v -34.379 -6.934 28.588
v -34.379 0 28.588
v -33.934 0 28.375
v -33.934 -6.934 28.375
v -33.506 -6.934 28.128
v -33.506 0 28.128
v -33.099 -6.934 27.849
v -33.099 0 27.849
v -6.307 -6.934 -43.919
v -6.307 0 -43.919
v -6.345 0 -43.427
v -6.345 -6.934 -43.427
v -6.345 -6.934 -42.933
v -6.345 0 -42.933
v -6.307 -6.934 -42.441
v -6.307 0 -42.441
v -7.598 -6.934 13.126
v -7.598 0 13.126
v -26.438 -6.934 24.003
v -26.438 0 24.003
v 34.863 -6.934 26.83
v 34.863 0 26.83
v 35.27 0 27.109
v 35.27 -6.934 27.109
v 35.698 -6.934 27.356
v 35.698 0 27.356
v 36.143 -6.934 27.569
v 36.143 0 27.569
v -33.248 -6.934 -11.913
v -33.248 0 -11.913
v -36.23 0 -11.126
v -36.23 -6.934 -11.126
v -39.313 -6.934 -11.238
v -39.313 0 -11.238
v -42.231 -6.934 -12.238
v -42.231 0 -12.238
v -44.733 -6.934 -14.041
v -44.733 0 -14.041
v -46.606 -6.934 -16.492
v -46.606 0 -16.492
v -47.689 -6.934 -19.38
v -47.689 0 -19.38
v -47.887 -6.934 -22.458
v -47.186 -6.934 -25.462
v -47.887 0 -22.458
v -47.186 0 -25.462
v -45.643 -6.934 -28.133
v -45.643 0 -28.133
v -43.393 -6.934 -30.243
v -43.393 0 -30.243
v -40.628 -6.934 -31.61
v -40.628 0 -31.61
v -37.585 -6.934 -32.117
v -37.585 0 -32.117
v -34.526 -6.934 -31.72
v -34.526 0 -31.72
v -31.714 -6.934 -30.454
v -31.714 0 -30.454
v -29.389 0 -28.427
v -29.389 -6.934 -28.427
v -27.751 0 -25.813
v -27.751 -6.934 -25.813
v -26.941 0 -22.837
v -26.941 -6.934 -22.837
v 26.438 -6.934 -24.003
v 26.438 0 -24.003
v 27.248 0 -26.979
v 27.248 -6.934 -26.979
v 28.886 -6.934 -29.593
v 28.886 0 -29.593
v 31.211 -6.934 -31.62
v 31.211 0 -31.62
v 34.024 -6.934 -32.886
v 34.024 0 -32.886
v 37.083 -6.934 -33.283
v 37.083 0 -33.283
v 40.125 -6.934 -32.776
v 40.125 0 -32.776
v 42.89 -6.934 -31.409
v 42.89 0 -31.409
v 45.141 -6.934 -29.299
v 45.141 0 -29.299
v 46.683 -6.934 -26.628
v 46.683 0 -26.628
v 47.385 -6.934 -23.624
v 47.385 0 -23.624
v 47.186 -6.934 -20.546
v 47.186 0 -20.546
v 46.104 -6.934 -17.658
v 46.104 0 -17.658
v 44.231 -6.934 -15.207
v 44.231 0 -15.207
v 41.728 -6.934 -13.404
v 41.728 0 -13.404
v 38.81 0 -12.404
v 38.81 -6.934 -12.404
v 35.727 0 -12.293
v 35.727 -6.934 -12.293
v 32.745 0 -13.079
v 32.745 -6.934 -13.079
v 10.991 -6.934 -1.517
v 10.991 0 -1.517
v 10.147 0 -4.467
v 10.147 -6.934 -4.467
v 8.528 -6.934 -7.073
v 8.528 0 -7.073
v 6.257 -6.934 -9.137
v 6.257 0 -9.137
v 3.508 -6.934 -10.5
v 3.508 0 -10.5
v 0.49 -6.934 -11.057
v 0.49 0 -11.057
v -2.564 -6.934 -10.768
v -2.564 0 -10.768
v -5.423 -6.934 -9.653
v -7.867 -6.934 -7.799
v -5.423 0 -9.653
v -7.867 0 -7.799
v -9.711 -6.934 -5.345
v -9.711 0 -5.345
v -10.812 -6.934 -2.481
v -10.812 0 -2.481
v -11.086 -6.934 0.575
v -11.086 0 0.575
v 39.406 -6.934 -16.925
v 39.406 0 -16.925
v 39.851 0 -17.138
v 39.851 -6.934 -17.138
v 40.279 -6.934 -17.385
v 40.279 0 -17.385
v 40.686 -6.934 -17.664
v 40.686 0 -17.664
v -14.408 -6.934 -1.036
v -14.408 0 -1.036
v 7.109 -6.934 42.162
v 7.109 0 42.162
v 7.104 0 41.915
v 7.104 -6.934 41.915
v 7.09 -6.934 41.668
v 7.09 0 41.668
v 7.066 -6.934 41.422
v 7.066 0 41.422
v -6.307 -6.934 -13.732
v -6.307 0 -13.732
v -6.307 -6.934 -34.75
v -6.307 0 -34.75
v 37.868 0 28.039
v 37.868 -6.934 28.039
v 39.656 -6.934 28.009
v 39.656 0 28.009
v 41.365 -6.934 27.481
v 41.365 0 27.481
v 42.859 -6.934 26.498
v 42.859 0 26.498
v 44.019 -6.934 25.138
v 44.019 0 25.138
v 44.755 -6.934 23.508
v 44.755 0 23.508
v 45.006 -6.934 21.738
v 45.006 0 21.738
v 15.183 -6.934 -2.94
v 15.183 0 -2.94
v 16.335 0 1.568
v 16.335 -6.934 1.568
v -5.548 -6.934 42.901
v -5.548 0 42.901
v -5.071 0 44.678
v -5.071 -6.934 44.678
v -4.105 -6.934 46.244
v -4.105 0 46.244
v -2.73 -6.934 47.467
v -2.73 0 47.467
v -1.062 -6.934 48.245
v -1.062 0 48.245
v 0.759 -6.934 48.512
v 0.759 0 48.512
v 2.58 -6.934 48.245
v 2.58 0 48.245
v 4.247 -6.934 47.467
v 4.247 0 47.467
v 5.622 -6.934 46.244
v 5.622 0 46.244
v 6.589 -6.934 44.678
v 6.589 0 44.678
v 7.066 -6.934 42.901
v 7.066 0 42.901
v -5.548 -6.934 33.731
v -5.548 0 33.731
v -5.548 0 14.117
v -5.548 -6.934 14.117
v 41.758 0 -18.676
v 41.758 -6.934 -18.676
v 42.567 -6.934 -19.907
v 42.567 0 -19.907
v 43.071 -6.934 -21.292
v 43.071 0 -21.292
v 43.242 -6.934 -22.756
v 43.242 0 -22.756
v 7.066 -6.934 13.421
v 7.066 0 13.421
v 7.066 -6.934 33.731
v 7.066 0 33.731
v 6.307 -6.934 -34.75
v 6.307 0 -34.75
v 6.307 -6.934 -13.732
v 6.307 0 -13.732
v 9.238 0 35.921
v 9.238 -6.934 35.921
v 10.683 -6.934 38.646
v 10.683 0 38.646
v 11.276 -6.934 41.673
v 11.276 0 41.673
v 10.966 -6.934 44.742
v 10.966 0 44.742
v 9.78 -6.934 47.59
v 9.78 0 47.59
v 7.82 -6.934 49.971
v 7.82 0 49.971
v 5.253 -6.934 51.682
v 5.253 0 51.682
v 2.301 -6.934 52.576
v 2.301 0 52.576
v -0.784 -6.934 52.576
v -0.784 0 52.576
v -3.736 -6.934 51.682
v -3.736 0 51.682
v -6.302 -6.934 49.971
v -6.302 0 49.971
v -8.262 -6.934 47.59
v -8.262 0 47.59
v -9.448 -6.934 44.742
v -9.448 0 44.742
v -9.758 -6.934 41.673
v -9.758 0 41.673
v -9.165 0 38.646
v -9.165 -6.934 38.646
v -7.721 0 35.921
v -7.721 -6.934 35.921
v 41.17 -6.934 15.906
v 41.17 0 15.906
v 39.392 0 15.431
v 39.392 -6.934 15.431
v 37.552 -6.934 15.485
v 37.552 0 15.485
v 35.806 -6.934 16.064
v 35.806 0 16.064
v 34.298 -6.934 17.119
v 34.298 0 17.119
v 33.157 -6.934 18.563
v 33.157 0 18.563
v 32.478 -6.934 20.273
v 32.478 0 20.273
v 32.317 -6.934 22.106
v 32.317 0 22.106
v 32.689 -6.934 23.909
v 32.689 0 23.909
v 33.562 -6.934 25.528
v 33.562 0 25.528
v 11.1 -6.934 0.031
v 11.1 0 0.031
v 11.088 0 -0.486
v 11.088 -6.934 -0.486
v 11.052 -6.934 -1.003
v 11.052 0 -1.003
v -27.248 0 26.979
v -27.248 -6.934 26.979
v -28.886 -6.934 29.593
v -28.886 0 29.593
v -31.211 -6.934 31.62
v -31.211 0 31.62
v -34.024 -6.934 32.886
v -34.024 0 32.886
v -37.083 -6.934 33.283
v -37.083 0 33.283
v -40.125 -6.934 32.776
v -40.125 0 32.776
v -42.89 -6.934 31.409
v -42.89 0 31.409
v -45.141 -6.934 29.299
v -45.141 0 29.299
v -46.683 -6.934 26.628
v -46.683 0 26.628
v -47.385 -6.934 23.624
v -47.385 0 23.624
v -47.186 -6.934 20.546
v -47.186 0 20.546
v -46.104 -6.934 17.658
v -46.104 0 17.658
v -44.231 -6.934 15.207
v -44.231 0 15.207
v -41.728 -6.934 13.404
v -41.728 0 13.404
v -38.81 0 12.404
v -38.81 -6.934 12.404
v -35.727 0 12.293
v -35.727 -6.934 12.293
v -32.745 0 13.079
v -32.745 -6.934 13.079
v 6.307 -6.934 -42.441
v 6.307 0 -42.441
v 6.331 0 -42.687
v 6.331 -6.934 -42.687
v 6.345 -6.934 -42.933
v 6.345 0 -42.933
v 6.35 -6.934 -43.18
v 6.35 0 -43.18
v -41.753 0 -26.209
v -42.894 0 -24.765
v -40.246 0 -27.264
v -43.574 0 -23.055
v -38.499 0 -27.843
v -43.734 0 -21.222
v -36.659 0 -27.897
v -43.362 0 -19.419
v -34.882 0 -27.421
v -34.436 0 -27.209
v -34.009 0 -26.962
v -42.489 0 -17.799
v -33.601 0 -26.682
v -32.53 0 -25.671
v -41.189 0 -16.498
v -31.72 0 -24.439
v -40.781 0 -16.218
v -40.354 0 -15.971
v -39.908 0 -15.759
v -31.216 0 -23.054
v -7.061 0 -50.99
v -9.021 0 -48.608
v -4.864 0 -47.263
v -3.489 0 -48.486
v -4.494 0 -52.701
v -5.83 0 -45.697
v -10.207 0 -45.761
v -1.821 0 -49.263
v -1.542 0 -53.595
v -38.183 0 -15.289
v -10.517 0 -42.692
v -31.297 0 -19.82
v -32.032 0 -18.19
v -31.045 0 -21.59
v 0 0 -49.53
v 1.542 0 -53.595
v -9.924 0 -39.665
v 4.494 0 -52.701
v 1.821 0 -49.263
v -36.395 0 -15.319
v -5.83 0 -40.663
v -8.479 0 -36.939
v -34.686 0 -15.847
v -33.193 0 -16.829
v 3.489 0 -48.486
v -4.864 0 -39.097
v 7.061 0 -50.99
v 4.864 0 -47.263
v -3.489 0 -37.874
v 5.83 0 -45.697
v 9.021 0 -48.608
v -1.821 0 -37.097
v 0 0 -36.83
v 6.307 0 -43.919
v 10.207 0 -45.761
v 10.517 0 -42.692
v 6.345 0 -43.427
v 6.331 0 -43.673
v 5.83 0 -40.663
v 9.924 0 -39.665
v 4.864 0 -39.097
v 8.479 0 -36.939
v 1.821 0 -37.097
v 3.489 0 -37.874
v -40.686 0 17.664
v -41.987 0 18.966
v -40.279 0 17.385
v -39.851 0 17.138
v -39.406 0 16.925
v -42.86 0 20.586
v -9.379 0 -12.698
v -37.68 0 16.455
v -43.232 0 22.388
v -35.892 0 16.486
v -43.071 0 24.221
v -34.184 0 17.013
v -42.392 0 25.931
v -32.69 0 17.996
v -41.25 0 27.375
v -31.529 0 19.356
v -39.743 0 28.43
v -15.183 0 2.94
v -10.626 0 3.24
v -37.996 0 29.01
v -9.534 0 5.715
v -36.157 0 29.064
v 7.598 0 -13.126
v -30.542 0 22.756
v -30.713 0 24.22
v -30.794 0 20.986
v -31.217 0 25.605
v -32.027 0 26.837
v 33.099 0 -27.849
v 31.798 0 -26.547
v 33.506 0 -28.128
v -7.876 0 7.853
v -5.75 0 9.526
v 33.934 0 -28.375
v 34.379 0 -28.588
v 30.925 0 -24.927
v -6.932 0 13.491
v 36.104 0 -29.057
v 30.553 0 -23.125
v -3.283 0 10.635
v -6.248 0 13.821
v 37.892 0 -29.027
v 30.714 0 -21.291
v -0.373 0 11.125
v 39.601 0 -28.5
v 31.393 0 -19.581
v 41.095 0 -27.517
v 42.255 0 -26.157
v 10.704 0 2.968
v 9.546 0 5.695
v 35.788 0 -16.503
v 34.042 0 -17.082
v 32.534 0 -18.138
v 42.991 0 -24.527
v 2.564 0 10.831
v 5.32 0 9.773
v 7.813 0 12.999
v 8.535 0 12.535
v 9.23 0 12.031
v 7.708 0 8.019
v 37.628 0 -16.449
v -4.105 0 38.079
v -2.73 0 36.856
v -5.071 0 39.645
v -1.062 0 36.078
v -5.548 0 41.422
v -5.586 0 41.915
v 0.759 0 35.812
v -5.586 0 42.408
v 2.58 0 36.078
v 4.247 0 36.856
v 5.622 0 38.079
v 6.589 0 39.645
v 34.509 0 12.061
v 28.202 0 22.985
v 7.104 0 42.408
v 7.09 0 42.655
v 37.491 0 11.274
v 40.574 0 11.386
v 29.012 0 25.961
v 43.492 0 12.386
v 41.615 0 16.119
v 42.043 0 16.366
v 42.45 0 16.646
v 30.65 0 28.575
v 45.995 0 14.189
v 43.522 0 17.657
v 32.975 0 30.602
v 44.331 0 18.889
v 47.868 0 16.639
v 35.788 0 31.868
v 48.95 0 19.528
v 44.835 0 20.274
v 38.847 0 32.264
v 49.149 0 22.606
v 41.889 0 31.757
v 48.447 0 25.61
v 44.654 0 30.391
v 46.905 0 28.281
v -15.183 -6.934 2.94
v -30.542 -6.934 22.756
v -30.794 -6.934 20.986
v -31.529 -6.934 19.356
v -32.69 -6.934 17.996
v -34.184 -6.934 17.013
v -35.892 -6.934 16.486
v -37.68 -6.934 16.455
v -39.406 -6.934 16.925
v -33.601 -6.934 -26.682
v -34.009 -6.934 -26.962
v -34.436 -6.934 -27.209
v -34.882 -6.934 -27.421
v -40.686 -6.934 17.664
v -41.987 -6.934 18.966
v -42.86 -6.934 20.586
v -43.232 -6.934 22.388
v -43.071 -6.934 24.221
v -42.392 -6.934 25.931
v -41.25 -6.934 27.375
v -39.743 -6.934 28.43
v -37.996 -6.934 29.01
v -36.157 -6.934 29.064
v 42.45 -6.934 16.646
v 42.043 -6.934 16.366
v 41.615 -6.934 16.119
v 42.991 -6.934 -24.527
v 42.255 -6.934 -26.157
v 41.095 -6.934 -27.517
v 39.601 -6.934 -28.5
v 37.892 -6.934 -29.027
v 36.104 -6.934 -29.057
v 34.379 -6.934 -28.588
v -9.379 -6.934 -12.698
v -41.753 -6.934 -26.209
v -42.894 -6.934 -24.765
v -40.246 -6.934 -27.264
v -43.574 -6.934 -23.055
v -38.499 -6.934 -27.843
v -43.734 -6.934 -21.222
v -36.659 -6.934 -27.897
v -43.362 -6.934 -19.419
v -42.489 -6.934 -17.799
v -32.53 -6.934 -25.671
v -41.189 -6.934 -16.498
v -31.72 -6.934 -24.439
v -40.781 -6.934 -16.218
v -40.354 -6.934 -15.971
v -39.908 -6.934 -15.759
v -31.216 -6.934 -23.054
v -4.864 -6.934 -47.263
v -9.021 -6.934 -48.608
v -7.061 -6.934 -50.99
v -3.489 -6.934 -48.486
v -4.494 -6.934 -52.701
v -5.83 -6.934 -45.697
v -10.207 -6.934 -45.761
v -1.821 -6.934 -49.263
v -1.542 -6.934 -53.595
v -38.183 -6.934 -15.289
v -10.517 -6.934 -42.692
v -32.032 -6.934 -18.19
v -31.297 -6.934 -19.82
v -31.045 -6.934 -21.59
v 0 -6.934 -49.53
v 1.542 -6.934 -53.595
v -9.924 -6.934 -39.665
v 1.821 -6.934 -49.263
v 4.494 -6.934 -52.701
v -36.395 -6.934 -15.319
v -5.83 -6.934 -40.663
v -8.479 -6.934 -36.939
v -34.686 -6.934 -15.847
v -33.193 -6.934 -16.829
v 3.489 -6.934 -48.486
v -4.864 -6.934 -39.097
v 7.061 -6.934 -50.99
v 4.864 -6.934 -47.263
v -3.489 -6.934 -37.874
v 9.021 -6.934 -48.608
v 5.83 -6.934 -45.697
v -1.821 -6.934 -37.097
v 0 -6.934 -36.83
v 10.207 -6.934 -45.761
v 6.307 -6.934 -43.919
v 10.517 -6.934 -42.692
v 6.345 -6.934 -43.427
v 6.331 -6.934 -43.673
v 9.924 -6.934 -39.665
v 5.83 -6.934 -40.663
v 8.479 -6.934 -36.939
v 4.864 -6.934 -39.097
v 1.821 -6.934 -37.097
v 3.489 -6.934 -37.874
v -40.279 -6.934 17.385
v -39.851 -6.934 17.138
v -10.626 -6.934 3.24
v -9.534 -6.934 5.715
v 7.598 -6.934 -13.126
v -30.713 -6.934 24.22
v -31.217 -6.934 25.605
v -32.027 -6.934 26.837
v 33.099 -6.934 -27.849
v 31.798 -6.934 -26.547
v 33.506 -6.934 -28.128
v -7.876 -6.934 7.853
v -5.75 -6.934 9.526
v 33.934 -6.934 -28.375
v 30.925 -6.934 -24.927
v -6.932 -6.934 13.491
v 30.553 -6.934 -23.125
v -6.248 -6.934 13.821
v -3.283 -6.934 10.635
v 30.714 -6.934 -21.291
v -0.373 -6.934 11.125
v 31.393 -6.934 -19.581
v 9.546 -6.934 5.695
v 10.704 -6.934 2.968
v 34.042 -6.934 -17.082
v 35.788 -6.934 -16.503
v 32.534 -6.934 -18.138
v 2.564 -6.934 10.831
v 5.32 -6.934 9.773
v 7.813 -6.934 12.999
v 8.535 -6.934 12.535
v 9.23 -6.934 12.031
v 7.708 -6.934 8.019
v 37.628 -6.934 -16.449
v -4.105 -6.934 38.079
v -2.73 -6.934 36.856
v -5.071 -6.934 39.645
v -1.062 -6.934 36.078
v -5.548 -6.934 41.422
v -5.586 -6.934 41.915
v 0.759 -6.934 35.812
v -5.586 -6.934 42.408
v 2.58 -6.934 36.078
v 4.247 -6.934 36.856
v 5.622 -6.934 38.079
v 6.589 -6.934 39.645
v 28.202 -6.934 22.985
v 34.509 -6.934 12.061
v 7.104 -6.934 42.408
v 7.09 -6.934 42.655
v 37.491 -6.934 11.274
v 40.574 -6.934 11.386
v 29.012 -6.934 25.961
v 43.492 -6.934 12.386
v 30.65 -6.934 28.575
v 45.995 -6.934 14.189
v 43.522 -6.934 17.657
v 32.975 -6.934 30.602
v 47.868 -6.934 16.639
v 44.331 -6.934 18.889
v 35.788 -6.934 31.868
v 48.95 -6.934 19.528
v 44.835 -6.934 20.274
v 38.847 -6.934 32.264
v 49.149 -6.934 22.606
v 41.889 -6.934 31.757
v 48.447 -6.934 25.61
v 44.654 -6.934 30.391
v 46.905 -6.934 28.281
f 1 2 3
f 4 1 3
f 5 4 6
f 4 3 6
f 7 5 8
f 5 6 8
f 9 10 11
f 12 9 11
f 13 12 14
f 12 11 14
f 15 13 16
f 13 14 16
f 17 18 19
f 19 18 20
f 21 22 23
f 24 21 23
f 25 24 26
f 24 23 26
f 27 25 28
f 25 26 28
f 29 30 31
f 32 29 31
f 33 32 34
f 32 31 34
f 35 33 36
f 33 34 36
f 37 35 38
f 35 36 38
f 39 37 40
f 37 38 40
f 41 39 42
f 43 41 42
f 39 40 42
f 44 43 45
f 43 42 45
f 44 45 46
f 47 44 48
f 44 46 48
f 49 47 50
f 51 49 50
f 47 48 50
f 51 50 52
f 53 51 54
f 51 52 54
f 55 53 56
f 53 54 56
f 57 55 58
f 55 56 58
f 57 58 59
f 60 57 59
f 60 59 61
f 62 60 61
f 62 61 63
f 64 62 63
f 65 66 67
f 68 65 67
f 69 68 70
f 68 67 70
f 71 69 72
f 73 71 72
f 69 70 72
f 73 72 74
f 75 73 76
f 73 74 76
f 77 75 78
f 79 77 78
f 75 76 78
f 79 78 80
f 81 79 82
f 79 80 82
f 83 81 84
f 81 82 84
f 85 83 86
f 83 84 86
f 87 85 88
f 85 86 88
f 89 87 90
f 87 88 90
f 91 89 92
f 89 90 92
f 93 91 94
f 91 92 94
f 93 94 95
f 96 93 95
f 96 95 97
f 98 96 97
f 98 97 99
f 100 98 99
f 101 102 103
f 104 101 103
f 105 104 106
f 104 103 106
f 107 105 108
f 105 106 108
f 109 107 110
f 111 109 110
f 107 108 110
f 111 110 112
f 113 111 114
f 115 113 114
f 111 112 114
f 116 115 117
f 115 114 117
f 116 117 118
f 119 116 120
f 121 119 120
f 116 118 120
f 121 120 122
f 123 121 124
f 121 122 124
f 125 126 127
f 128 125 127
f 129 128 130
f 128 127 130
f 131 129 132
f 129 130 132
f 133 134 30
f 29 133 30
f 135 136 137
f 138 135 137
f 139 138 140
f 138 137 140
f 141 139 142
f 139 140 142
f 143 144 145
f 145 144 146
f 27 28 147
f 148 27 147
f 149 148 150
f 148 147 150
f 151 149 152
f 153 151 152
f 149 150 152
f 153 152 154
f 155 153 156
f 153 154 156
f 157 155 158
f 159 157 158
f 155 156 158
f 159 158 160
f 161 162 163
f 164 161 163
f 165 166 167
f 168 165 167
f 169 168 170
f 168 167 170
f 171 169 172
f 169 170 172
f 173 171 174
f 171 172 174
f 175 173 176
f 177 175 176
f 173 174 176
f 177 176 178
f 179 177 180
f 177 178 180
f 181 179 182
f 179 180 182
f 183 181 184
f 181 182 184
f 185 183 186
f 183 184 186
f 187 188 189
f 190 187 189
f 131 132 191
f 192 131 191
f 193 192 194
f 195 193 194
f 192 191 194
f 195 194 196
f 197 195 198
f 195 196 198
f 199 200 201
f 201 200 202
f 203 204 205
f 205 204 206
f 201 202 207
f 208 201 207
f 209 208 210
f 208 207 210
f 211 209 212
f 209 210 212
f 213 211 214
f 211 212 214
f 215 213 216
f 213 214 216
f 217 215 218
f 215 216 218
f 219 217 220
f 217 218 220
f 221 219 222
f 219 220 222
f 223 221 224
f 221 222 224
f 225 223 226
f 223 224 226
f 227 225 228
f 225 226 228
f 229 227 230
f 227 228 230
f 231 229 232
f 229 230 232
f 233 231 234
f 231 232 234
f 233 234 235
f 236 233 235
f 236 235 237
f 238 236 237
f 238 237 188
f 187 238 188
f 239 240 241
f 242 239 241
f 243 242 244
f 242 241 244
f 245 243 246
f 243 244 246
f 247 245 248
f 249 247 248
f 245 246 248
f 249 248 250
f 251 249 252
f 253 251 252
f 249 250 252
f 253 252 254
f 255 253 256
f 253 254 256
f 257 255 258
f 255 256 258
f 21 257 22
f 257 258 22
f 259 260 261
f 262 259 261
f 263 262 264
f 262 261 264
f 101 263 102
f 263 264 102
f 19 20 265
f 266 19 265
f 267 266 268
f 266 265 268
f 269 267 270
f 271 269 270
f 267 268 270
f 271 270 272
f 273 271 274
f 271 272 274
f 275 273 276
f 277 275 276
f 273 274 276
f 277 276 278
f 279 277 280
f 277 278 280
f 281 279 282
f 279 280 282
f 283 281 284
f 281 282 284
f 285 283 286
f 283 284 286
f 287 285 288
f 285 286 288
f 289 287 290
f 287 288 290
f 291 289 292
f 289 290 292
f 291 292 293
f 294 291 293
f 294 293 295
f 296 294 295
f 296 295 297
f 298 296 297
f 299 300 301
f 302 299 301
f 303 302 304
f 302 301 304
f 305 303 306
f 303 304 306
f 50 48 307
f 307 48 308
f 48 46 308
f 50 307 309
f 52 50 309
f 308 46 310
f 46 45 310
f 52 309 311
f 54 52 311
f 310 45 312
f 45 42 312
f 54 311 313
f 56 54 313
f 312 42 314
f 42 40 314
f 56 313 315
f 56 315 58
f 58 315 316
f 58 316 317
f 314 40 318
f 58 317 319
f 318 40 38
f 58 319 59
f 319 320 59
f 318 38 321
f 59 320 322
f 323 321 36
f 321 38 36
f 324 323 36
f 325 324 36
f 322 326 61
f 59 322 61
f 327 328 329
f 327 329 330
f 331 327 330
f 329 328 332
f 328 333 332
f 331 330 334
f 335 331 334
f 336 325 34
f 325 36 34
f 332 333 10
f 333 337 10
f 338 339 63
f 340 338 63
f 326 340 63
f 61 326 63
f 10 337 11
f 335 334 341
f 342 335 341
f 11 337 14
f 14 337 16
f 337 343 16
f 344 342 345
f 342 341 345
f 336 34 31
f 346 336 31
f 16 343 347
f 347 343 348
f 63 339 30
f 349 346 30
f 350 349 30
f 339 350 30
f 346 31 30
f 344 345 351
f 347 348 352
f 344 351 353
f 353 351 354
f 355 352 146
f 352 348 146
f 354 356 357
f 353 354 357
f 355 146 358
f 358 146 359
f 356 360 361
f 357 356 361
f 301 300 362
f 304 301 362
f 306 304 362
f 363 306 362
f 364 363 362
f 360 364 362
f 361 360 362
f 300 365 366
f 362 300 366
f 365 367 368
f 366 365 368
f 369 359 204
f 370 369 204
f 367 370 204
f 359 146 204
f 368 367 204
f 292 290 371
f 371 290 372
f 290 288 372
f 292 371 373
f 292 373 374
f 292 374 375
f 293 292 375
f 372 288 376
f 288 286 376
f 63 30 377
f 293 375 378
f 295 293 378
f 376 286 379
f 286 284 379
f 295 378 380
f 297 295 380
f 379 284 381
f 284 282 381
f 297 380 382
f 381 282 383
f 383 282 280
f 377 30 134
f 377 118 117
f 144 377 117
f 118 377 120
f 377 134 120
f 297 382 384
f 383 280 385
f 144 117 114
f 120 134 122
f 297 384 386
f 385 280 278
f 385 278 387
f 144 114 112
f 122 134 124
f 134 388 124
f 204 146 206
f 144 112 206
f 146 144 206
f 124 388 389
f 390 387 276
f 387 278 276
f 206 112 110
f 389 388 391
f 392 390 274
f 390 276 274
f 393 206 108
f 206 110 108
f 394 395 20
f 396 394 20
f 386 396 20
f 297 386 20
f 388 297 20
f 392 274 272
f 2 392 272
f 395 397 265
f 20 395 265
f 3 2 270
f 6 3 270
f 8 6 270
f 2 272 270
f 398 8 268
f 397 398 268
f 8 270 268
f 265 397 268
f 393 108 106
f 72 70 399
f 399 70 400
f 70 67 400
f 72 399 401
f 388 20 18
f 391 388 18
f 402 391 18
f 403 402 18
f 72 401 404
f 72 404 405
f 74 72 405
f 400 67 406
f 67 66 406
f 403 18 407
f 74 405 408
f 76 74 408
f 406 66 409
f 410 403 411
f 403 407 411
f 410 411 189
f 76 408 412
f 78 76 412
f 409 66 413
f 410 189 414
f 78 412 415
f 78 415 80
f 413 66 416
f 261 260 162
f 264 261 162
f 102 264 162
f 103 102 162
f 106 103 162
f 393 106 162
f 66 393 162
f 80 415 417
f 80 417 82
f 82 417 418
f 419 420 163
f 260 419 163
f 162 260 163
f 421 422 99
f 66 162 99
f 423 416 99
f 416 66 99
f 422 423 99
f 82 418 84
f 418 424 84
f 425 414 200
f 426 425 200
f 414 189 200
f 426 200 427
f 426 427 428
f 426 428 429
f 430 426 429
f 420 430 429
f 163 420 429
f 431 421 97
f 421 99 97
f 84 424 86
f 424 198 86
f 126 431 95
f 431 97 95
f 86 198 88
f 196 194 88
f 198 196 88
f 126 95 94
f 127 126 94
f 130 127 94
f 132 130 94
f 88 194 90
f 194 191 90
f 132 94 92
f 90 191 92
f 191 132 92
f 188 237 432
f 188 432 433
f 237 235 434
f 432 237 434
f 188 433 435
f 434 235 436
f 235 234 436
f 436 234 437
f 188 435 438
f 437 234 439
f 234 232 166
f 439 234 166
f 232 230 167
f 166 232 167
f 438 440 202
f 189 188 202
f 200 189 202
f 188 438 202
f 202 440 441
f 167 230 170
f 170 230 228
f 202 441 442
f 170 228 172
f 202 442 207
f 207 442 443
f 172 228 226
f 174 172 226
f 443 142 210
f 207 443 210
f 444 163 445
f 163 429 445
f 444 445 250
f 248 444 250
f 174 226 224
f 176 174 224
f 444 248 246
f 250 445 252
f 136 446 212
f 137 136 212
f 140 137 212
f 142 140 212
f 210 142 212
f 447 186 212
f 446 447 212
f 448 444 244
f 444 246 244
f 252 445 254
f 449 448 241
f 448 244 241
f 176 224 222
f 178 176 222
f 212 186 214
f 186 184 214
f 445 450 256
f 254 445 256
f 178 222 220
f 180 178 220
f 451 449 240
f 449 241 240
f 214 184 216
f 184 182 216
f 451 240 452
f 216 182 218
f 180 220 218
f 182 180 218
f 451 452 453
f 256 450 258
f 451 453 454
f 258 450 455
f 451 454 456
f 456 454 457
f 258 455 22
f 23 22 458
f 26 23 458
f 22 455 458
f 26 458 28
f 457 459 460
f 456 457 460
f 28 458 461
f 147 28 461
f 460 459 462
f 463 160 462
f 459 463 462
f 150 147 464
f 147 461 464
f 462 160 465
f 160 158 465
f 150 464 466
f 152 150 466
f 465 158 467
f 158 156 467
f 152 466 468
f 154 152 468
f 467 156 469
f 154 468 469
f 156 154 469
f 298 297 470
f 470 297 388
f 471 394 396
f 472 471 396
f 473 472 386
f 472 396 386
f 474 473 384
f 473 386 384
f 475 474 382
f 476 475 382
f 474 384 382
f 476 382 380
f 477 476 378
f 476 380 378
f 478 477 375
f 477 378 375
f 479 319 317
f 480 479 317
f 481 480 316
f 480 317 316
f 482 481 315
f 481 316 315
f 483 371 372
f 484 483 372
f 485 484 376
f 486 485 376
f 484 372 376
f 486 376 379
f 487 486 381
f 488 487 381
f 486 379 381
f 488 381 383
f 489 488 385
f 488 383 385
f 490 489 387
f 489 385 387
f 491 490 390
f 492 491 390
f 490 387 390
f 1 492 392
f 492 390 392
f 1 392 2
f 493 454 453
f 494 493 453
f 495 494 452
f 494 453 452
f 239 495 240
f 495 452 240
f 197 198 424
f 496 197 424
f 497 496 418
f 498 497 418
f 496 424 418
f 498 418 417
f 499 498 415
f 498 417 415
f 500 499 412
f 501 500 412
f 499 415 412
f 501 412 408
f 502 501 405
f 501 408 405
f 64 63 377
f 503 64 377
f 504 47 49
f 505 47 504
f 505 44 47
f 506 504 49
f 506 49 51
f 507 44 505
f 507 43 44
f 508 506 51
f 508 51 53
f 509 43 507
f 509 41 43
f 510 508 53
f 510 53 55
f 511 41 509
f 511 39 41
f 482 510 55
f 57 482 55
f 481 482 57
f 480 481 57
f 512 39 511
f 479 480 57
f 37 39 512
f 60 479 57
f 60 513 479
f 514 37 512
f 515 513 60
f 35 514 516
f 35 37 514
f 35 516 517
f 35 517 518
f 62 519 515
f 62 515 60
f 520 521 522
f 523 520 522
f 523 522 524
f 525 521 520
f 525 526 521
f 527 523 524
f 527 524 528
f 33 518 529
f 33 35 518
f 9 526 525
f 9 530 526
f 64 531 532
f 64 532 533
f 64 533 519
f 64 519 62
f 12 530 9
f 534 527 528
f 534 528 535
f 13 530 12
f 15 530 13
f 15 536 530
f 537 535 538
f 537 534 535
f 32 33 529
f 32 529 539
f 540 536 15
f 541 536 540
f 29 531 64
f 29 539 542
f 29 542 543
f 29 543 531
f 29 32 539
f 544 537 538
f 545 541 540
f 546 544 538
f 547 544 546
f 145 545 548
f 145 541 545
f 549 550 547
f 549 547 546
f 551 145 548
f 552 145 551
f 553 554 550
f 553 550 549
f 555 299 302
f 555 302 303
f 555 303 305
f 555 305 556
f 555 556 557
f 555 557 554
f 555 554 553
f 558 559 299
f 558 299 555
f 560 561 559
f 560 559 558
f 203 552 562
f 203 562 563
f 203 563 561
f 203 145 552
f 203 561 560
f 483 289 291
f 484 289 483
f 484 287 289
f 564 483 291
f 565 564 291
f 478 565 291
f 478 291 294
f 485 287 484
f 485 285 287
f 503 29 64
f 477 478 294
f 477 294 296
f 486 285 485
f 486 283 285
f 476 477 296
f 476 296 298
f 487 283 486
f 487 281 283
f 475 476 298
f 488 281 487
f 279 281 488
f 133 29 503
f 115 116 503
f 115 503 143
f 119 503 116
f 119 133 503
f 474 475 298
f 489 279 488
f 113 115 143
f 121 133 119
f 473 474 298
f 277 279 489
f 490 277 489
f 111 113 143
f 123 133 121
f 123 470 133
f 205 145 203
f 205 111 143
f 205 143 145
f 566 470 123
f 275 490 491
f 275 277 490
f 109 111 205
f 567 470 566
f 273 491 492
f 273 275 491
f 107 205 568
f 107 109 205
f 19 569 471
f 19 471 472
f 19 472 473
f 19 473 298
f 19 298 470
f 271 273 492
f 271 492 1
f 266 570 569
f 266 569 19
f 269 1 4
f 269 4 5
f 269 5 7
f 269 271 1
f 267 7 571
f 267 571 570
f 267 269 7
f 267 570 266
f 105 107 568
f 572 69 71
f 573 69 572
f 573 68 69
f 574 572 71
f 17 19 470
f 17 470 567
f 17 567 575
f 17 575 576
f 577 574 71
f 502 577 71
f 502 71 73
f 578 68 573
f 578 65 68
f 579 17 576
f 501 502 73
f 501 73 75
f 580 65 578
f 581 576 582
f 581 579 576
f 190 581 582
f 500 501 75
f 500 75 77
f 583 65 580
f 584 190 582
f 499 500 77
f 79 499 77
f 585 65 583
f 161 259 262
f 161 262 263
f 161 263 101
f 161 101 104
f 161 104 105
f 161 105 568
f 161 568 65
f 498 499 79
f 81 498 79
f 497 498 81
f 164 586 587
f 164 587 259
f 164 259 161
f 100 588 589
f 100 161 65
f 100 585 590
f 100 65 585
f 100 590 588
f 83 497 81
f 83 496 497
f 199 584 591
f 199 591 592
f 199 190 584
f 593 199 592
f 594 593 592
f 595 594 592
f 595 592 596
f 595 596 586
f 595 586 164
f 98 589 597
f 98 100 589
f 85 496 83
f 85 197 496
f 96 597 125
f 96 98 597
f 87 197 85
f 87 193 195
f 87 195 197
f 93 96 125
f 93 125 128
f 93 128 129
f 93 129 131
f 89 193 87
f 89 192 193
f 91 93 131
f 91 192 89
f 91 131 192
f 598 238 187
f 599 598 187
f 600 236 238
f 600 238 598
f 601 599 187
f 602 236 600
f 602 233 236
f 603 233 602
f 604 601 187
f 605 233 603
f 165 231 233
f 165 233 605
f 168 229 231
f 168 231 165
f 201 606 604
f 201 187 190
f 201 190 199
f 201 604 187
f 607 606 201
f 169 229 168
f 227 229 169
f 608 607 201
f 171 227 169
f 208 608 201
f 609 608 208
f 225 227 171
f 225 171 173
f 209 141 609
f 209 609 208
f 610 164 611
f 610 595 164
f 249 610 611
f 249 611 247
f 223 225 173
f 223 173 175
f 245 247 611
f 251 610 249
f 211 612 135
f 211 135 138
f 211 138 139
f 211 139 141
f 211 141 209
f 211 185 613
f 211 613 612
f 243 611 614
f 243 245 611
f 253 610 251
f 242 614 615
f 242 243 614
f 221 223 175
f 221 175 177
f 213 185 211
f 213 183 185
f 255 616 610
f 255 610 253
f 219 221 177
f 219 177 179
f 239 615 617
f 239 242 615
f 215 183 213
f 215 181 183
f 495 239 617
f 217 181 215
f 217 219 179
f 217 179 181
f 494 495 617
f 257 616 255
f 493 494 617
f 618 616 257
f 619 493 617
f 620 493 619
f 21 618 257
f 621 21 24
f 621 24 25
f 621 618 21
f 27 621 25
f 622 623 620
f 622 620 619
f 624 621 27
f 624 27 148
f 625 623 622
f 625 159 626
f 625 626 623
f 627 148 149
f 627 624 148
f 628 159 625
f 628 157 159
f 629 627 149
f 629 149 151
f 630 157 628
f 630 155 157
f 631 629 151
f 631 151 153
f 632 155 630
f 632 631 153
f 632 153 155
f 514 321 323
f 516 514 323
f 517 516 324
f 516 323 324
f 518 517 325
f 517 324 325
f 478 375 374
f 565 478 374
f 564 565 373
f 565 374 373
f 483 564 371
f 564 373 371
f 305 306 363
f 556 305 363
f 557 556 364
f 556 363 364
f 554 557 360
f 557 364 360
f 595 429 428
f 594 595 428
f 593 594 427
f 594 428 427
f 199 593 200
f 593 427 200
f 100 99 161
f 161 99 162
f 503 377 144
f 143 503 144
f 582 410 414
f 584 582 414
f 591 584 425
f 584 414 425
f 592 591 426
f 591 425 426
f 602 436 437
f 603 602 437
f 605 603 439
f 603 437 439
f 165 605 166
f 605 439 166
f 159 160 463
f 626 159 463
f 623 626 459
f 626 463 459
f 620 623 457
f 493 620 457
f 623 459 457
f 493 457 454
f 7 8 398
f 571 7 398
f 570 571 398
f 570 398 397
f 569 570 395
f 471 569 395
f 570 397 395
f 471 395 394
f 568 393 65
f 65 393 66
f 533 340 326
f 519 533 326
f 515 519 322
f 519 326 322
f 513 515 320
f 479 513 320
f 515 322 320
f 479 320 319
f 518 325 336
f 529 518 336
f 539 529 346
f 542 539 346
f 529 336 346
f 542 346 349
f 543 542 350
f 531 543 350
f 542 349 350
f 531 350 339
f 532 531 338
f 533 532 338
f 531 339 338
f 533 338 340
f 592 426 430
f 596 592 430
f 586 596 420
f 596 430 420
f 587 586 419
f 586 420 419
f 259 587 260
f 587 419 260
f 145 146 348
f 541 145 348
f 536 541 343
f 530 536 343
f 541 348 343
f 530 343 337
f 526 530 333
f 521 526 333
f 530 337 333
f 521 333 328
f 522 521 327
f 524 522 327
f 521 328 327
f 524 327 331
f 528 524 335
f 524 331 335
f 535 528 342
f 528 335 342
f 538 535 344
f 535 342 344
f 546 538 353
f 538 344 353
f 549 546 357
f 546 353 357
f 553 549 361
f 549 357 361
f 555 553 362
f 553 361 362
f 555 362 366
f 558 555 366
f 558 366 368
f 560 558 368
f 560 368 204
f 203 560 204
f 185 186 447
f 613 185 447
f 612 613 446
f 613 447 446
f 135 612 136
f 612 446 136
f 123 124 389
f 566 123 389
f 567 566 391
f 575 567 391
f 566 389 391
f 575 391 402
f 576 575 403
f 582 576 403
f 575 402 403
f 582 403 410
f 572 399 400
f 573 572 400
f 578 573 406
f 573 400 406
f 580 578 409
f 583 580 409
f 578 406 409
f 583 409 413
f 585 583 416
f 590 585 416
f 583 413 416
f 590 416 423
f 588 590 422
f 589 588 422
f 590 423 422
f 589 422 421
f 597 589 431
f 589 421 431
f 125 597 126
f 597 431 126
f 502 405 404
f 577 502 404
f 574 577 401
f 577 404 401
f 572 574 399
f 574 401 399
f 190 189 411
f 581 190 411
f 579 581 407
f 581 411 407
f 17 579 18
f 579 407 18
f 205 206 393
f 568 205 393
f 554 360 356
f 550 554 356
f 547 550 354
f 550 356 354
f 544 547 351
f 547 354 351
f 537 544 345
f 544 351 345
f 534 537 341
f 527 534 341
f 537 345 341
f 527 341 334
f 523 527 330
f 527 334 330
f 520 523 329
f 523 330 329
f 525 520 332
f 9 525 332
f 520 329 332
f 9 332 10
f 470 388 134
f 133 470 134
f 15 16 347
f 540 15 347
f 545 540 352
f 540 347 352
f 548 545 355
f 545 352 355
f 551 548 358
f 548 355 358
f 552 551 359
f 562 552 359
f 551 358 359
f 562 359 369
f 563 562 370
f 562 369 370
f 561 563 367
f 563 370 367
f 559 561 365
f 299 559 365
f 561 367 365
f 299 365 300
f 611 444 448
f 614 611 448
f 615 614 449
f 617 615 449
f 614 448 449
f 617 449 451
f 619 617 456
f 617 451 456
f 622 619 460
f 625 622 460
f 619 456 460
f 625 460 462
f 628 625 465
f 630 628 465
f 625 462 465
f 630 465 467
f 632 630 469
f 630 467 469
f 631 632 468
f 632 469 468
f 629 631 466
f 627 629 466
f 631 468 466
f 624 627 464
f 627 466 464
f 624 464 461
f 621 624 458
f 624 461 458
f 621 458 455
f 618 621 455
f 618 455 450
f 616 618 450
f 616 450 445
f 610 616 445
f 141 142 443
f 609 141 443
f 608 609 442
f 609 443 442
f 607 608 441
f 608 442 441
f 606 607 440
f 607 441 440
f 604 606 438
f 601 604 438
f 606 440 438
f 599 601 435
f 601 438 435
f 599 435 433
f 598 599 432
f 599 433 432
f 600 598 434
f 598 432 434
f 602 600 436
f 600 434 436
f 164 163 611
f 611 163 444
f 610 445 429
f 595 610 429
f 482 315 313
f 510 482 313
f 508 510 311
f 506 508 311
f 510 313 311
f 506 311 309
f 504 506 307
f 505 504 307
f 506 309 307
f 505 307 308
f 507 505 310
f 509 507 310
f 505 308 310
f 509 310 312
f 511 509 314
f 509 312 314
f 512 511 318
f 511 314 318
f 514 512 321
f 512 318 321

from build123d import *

# Parameters (mm, degrees)
F1_DEPTH = 6.9342


with BuildPart() as f1:
    # F0 (on Front) → F1 (new body)
    with BuildSketch(Plane.XZ):
        with BuildLine():
            Line((28.202122, 22.984592), (9.230435, 12.031283))
            ThreePointArc((9.230435, 12.031283), (8.177557, 12.772114), (7.065545, 13.420814))
            Line((7.065545, 13.420814), (7.065545, 33.731301))
            ThreePointArc((7.065545, 33.731301), (0.758717, 52.689846), (-5.54811, 33.731301))
            Line((-5.54811, 33.731301), (-5.54811, 14.117454))
            ThreePointArc((-5.54811, 14.117454), (-6.591857, 13.660258), (-7.59826, 13.125854))
            Line((-7.59826, 13.125854), (-26.438109, 24.003046))
            ThreePointArc((-26.438109, 24.003046), (-46.010104, 28.020445), (-32.744936, 13.0793))
            Line((-32.744936, 13.0793), (-15.183252, 2.940057))
            Line((-15.183252, 2.940057), (-14.407735, -1.035813))
            Line((-14.407735, -1.035813), (-33.247584, -11.913005))
            ThreePointArc((-33.247584, -11.913005), (-46.512752, -26.85415), (-26.940757, -22.83675))
            Line((-26.940757, -22.83675), (-9.379072, -12.697507))
            Line((-9.379072, -12.697507), (-6.306827, -13.731525))
            Line((-6.306827, -13.731525), (-6.306827, -34.749755))
            ThreePointArc((-6.306827, -34.749755), (0, -53.7083), (6.306827, -34.749755))
            Line((6.306827, -34.749755), (6.306827, -13.731525))
            Line((6.306827, -13.731525), (7.59826, -13.125854))
            Line((7.59826, -13.125854), (26.438109, -24.003046))
            ThreePointArc((26.438109, -24.003046), (46.010104, -28.020445), (32.744936, -13.0793))
            Line((32.744936, -13.0793), (15.183252, -2.940057))
            Line((15.183252, -2.940057), (16.33474, 1.567961))
            Line((16.33474, 1.567961), (34.50895, 12.060847))
            ThreePointArc((34.50895, 12.060847), (47.774118, 27.001992), (28.202122, 22.984592))
        make_face()
        with BuildLine():
            ThreePointArc((6.306827, -42.440791), (6.339198, -42.809766), (6.35, -43.18))
            ThreePointArc((6.35, -43.18), (6.339198, -43.550234), (6.306827, -43.919209))
            ThreePointArc((6.306827, -43.919209), (0, -49.53), (-6.306827, -43.919209))
            ThreePointArc((-6.306827, -43.919209), (-6.35, -43.18), (-6.306827, -42.440791))
            ThreePointArc((-6.306827, -42.440791), (0, -36.83), (6.306827, -42.440791))
        make_face(mode=Mode.SUBTRACT)
        with BuildLine():
            ThreePointArc((-34.881737, -27.421477), (-42.894238, -24.765), (-41.188564, -16.497732))
            ThreePointArc((-41.188564, -16.497732), (-40.569977, -16.090739), (-39.908217, -15.758523))
            ThreePointArc((-39.908217, -15.758523), (-33.904746, -16.285211), (-31.044977, -21.59))
            ThreePointArc((-31.044977, -21.59), (-31.719954, -24.438967), (-33.60139, -26.682268))
            ThreePointArc((-33.60139, -26.682268), (-34.219977, -27.089261), (-34.881737, -27.421477))
        make_face(mode=Mode.SUBTRACT)
        with BuildLine():
            ThreePointArc((43.242329, -22.756295), (40.38256, -28.061085), (34.379089, -28.587772))
            ThreePointArc((34.379089, -28.587772), (33.717329, -28.255557), (33.098742, -27.848564))
            ThreePointArc((33.098742, -27.848564), (31.393068, -19.581295), (39.405569, -16.924818))
            ThreePointArc((39.405569, -16.924818), (40.067329, -17.257034), (40.685916, -17.664027))
            ThreePointArc((40.685916, -17.664027), (42.567352, -19.907329), (43.242329, -22.756295))
        make_face(mode=Mode.SUBTRACT)
        with BuildLine():
            ThreePointArc((-33.098742, 27.848564), (-31.217306, 25.605262), (-30.542329, 22.756295))
            ThreePointArc((-30.542329, 22.756295), (-33.402098, 17.451506), (-39.405569, 16.924818))
            ThreePointArc((-39.405569, 16.924818), (-40.067329, 17.257034), (-40.685916, 17.664027))
            ThreePointArc((-40.685916, 17.664027), (-42.39159, 25.931295), (-34.379089, 28.587772))
            ThreePointArc((-34.379089, 28.587772), (-33.717329, 28.255557), (-33.098742, 27.848564))
        make_face(mode=Mode.SUBTRACT)
        with BuildLine():
            ThreePointArc((5.319741, 9.773443), (9.546036, 5.695287), (11.0998, 0.031477))
            ThreePointArc((11.0998, 0.031477), (11.072628, -0.744715), (10.991244, -1.517107))
            ThreePointArc((10.991244, -1.517107), (-1.047034, -11.01883), (-11.086495, 0.574793))
            ThreePointArc((-11.086495, 0.574793), (-8.770532, 6.834662), (-3.28325, 10.634581))
            ThreePointArc((-3.28325, 10.634581), (1.105538, 11.076084), (5.319741, 9.773443))
        make_face(mode=Mode.SUBTRACT)
        with BuildLine():
            ThreePointArc((36.143102, 27.569319), (42.146573, 27.042631), (45.006342, 21.737842))
            ThreePointArc((45.006342, 21.737842), (44.331366, 18.888875), (42.449929, 16.645573))
            ThreePointArc((42.449929, 16.645573), (41.831342, 16.23858), (41.169583, 15.906365))
            ThreePointArc((41.169583, 15.906365), (33.157081, 18.562842), (34.862755, 26.83011))
            ThreePointArc((34.862755, 26.83011), (35.481342, 27.237103), (36.143102, 27.569319))
        make_face(mode=Mode.SUBTRACT)
        with BuildLine():
            ThreePointArc((-5.54811, 42.900755), (0.758717, 48.511546), (7.065545, 42.900755))
            ThreePointArc((7.065545, 42.900755), (7.097915, 42.53178), (7.108717, 42.161546))
            ThreePointArc((7.108717, 42.161546), (7.097915, 41.791312), (7.065545, 41.422338))
            ThreePointArc((7.065545, 41.422338), (0.758717, 35.811546), (-5.54811, 41.422338))
            ThreePointArc((-5.54811, 41.422338), (-5.591283, 42.161546), (-5.54811, 42.900755))
        make_face(mode=Mode.SUBTRACT)
    extrude(amount=F1_DEPTH)


solid = f1.part
